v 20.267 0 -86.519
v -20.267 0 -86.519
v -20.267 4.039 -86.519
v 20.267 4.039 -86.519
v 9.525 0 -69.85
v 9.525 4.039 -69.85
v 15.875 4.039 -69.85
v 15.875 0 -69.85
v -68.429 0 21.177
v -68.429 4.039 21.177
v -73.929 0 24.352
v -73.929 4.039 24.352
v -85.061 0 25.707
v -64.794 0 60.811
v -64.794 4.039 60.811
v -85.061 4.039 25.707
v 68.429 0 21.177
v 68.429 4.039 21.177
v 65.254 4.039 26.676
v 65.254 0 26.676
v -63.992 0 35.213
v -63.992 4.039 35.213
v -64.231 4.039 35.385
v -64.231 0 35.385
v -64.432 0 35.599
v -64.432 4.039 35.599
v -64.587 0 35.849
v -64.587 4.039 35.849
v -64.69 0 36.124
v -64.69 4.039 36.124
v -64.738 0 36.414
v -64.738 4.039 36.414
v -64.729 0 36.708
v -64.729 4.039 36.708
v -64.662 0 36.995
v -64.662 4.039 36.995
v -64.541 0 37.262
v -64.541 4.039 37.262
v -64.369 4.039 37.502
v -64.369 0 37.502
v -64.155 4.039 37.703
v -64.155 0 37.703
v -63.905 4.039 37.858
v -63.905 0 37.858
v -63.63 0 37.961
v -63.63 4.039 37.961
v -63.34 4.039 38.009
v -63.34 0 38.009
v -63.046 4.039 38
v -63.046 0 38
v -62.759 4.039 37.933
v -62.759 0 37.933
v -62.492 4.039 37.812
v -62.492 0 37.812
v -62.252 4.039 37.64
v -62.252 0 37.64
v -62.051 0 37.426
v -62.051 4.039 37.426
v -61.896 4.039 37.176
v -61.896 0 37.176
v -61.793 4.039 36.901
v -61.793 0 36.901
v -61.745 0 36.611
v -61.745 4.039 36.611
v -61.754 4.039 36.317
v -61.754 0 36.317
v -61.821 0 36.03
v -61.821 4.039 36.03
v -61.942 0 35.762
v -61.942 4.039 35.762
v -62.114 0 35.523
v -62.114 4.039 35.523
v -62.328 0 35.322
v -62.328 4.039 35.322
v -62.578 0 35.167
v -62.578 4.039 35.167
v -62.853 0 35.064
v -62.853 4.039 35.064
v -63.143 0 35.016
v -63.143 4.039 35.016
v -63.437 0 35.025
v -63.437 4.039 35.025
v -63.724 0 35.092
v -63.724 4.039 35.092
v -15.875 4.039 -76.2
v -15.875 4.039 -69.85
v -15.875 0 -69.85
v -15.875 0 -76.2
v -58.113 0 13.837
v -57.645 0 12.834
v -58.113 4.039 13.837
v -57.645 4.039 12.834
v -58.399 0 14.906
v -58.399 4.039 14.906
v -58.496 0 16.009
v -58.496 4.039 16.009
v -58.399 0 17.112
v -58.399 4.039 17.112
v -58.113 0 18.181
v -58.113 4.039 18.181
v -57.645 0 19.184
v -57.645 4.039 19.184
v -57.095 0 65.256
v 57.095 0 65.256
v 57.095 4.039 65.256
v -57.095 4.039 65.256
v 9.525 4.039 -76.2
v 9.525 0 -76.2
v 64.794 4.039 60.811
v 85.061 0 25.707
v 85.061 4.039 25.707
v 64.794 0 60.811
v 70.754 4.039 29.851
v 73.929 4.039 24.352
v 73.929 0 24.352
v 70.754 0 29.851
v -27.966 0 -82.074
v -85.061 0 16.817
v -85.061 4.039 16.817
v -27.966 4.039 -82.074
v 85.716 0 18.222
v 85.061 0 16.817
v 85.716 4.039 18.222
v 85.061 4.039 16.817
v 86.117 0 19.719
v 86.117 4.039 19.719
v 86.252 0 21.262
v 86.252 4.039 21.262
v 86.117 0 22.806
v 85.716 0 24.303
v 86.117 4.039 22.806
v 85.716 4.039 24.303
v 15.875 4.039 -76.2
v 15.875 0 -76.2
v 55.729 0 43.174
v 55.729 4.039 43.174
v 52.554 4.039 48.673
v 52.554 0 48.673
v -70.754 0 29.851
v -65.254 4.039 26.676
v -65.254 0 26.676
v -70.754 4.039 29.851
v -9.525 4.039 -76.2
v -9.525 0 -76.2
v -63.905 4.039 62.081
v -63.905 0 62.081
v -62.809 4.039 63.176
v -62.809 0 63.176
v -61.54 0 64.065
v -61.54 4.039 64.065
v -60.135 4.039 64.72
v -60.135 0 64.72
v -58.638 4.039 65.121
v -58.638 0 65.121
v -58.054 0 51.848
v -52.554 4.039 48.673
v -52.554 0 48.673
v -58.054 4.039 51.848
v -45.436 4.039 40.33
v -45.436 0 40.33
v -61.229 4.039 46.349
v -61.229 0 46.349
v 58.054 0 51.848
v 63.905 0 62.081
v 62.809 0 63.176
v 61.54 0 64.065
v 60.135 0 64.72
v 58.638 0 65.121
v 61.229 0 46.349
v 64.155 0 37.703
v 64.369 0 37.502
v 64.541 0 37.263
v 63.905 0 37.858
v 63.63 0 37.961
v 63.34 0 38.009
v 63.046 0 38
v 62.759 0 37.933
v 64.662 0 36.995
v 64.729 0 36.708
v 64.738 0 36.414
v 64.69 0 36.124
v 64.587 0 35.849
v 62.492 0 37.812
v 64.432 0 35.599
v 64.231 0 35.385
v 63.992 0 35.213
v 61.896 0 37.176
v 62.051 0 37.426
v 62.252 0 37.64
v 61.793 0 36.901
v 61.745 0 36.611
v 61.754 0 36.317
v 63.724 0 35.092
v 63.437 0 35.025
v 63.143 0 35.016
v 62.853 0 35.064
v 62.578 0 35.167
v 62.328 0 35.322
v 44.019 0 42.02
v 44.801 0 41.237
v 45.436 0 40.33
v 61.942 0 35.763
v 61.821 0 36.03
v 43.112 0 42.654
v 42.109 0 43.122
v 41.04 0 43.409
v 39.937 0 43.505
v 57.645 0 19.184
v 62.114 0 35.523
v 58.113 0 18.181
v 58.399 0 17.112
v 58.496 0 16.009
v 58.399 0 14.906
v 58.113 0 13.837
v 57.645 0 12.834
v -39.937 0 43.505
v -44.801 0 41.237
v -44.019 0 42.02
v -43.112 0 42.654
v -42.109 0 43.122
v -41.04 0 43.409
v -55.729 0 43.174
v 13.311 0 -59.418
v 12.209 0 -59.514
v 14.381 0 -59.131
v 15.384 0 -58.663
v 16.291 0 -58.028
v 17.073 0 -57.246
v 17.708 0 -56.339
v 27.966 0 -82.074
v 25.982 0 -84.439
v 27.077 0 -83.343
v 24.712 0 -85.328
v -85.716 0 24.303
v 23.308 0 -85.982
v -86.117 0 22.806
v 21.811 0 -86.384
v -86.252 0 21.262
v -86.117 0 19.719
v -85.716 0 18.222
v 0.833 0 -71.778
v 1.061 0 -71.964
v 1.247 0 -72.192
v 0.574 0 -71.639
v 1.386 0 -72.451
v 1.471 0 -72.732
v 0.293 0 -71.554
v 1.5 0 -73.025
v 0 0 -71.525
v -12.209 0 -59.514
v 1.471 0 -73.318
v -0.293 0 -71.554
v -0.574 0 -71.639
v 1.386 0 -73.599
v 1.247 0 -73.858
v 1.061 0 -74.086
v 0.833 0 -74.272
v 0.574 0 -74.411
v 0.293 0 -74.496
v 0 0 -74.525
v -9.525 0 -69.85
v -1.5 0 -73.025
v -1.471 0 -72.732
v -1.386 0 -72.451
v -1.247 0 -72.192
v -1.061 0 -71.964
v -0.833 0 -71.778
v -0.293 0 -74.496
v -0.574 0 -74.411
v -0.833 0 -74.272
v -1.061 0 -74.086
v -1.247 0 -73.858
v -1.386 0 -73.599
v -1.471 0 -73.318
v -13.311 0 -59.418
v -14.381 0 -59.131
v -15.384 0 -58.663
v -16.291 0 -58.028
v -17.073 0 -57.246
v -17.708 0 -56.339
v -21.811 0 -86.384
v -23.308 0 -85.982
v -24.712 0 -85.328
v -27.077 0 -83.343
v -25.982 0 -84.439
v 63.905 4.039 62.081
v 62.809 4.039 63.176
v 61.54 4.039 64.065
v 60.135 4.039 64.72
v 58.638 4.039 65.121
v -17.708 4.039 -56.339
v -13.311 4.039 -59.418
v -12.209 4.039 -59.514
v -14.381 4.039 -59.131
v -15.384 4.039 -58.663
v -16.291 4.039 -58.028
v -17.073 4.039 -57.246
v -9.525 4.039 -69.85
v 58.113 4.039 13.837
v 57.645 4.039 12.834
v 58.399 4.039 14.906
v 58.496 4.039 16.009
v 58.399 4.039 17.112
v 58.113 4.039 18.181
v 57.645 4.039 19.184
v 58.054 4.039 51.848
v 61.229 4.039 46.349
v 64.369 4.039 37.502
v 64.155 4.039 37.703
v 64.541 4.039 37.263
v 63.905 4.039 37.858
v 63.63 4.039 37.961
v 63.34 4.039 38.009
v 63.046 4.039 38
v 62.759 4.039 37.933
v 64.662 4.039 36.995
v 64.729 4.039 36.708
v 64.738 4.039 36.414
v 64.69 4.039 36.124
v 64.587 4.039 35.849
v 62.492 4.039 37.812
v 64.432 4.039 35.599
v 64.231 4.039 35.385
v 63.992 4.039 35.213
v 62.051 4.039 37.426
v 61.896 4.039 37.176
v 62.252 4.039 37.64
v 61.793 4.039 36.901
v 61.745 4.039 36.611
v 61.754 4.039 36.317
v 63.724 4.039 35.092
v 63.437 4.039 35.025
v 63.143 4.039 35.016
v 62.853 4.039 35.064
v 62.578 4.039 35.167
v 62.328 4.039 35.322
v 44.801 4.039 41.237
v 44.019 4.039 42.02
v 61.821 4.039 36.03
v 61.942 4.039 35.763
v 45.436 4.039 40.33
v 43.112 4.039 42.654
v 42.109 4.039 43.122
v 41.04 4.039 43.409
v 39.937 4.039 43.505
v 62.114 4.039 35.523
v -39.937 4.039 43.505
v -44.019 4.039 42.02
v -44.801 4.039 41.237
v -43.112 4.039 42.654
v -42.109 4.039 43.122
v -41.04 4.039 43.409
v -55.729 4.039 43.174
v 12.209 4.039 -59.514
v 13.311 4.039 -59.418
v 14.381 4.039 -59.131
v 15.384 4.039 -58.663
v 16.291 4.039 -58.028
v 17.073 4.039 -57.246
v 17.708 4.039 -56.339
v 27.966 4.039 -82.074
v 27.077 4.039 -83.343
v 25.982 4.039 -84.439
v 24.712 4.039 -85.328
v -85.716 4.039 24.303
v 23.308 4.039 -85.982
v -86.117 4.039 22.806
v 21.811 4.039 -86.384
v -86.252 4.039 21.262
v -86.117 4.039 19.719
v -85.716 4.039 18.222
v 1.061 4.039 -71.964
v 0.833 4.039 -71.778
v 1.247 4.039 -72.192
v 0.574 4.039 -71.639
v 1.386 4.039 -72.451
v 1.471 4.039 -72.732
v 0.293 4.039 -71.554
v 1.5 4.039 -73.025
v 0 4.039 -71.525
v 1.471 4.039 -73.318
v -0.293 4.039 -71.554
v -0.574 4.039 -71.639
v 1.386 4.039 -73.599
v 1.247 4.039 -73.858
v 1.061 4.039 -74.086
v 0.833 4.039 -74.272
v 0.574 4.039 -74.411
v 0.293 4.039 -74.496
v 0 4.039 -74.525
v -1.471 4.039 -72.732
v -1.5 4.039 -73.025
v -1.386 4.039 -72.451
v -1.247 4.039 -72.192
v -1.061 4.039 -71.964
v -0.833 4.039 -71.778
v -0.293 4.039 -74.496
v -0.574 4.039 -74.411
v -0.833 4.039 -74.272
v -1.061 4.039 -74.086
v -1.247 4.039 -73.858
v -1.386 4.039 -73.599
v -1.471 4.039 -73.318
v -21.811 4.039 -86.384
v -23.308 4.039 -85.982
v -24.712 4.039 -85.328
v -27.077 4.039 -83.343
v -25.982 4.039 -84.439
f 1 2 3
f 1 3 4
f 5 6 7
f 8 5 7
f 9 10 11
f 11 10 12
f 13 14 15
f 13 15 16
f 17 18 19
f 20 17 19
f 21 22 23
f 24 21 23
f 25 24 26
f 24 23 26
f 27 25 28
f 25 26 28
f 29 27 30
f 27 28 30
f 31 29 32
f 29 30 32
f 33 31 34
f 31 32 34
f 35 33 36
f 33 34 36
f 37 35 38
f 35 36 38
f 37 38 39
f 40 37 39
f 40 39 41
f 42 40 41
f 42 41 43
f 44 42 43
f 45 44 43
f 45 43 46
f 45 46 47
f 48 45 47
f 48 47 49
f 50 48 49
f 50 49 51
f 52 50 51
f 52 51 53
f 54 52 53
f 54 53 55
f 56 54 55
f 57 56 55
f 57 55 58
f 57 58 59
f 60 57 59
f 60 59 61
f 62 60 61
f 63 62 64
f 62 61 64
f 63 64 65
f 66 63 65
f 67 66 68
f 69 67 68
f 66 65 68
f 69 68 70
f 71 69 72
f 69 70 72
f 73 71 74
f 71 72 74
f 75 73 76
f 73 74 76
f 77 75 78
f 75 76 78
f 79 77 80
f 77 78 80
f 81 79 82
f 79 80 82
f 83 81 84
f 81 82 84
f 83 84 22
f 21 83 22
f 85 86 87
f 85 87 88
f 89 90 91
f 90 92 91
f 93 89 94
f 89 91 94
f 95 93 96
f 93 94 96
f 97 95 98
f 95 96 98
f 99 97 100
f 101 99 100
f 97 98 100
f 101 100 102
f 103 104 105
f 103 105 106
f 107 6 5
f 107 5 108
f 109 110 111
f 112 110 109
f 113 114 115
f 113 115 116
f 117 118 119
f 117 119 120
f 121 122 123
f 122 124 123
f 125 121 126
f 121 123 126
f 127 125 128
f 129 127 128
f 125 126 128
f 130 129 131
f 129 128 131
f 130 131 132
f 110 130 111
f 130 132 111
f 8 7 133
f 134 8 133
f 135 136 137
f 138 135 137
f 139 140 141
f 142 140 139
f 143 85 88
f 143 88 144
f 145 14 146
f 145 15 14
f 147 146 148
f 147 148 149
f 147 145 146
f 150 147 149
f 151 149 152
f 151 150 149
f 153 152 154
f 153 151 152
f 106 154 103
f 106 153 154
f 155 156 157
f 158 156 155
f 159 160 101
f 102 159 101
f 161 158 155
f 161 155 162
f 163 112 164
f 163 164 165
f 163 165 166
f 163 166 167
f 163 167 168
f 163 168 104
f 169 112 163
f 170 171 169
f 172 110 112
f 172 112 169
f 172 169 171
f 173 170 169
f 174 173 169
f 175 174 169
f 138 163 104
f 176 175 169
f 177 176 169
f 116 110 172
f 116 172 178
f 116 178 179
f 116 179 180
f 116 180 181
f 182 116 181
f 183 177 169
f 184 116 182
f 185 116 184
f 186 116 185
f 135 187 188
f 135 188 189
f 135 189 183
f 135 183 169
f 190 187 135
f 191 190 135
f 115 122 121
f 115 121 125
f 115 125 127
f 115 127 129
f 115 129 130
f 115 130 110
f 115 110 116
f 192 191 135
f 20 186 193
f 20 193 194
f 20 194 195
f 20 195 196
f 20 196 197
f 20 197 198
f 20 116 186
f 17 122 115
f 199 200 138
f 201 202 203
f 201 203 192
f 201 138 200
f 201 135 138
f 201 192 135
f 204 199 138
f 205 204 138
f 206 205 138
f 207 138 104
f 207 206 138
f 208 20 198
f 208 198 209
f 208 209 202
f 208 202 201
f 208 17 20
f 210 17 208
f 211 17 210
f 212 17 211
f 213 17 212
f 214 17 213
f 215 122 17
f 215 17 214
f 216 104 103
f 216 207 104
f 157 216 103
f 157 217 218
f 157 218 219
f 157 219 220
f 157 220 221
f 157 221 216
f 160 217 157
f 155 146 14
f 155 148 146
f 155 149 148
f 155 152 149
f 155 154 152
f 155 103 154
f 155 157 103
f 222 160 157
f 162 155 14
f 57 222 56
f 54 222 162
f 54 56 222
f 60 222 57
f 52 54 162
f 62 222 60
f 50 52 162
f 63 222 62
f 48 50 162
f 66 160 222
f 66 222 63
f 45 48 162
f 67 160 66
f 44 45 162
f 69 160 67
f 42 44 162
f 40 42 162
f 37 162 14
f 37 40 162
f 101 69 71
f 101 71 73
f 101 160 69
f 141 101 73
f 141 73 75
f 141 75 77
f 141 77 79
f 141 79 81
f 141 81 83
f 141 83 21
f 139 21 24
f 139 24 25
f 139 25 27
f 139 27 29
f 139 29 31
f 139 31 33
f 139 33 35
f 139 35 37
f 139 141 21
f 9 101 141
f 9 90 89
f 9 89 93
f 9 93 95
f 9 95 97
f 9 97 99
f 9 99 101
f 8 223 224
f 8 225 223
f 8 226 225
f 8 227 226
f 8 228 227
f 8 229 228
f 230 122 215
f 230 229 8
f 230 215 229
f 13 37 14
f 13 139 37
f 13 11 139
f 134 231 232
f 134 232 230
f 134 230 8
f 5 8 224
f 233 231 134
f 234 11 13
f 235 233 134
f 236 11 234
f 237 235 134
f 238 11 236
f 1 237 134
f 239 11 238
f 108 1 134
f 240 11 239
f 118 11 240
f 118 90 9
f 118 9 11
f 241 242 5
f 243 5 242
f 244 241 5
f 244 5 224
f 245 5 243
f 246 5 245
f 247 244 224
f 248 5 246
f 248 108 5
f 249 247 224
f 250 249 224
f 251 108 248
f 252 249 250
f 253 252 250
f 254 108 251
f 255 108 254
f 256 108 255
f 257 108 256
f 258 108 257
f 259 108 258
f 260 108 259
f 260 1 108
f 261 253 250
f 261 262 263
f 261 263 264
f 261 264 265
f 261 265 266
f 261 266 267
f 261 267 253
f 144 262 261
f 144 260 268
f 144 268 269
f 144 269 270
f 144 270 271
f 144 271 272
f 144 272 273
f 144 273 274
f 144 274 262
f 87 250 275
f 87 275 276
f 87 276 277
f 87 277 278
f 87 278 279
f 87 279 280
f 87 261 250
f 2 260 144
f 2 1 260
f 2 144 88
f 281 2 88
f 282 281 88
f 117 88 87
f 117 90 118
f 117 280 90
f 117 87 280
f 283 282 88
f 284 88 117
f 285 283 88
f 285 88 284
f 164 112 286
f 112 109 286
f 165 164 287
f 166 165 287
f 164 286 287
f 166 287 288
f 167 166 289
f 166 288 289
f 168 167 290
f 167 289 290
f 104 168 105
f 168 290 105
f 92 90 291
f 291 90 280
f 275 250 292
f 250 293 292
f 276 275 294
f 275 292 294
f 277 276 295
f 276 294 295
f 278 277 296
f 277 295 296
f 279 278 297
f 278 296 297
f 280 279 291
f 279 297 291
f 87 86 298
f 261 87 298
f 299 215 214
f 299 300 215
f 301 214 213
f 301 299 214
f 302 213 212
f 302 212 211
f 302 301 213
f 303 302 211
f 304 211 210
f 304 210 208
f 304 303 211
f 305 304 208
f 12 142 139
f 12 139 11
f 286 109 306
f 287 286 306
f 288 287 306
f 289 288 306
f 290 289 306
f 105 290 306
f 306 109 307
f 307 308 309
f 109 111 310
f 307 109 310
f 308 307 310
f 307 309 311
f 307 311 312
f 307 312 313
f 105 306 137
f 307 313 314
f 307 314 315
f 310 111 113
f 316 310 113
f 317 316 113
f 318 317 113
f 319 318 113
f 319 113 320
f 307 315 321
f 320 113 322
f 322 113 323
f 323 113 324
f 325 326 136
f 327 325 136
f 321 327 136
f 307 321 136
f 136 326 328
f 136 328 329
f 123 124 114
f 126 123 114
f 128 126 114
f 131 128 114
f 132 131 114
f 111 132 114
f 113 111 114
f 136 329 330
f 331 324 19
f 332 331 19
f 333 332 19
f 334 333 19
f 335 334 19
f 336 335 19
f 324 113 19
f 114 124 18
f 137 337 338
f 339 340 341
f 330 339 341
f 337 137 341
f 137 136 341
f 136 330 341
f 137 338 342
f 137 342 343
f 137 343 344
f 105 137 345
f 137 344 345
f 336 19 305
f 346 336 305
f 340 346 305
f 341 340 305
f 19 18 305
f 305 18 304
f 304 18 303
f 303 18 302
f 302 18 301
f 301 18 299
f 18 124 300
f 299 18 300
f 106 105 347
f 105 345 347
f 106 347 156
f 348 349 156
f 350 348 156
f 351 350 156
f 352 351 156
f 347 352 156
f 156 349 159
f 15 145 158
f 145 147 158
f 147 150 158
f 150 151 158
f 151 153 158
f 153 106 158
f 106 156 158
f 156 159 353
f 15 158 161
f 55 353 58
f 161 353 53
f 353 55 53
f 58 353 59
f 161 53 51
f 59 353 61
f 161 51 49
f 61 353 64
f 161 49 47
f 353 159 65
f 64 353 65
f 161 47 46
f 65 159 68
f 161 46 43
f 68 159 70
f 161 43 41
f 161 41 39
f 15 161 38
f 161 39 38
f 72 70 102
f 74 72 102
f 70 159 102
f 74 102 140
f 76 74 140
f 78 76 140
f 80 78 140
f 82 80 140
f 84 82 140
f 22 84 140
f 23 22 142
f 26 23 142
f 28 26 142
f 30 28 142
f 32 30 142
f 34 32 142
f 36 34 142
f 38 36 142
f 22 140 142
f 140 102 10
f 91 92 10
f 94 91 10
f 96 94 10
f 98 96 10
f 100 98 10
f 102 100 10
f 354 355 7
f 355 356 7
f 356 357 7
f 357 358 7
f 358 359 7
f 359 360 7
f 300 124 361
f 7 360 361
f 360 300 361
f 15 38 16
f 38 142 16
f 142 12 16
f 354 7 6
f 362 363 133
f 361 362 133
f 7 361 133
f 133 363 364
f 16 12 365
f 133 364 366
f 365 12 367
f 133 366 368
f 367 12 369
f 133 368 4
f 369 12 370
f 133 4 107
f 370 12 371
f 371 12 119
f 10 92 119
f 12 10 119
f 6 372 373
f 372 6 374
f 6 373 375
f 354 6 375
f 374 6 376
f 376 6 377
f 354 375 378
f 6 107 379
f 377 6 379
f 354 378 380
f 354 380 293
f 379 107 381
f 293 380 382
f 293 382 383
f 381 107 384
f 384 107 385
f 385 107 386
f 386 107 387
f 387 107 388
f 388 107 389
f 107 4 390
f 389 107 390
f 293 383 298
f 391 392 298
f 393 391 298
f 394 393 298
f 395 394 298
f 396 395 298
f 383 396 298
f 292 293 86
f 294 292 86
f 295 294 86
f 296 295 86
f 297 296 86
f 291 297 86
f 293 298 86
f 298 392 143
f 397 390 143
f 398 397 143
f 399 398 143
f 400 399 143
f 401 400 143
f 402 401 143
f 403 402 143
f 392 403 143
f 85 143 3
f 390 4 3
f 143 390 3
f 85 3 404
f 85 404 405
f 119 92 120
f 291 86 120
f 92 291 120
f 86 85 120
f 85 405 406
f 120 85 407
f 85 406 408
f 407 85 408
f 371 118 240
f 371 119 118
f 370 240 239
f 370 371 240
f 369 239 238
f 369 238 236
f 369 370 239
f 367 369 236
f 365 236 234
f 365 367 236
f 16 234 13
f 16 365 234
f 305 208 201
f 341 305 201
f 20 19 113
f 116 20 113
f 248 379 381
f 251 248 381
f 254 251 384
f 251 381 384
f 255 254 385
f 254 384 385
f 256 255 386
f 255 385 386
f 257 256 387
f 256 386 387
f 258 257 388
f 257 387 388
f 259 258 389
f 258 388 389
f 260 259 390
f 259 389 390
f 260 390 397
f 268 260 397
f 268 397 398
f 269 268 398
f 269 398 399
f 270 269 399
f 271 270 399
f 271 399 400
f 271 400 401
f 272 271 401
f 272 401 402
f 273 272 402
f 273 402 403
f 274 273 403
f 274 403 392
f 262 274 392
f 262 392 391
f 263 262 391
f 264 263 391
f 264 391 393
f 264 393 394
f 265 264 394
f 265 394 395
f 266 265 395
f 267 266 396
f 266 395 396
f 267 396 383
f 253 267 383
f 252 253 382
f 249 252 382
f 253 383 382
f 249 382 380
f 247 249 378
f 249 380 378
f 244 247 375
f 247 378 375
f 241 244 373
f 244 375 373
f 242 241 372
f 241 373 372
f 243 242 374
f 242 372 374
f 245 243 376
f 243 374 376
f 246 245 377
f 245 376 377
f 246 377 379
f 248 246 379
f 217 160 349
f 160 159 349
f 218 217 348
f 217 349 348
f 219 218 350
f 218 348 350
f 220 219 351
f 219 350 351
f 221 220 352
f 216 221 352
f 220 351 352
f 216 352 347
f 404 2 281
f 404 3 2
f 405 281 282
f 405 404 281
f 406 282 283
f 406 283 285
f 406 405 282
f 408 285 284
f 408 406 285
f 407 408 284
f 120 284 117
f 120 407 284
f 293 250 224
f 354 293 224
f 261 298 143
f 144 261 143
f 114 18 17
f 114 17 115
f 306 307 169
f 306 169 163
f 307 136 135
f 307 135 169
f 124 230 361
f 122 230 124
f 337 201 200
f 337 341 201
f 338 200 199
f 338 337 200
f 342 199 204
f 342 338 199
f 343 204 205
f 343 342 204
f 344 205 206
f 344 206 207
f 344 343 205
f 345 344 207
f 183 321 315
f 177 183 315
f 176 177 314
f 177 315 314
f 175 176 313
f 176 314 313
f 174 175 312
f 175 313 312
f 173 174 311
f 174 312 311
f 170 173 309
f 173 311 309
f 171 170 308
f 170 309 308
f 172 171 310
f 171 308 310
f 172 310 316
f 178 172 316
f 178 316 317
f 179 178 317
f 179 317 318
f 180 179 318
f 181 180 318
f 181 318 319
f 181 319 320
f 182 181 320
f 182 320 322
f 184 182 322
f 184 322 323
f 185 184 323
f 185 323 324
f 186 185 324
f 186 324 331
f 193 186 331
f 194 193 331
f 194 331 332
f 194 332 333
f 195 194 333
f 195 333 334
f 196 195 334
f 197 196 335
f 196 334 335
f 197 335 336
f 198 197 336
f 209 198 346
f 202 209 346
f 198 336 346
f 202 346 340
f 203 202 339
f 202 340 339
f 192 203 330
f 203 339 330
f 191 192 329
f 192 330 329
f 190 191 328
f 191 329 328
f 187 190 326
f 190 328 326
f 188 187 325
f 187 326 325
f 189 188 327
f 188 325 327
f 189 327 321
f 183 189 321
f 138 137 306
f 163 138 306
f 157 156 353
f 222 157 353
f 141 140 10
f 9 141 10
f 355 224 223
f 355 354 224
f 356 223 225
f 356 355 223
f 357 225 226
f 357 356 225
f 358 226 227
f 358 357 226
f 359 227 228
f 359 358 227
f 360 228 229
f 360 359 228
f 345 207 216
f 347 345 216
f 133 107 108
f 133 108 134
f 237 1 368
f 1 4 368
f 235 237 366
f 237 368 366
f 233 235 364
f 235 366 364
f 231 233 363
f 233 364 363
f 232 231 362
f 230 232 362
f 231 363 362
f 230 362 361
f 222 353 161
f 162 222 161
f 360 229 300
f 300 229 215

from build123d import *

# Parameters (mm, degrees)
BOSS_EXTRUDE1_DEPTH = 4.0386
SKETCH2_R           = 1.5
SKETCH2_W           = 6.35
SKETCH2_H           = 6.35
CUT_EXTRUDE1_DEPTH  = 124.208459614
CIRPATTERN1_COUNT   = 3
FILLET1_R           = 8.89
FILLET2_R           = 6.35


with BuildPart() as part:
    # Sketch1 → Boss-Extrude1 (new body)
    with BuildSketch(Plane(origin=(0, 0, 0), x_dir=(1, 0, 0), z_dir=(0, 1, 0))):
        Polygon((-25.4, 86.518604358), (25.4, 86.518604358), (87.627309274, -21.262256923), (62.227309274, -65.256347435), (-62.227309274, -65.256347435), (-87.627309274, -21.262256923), align=None)
        Polygon((-15.875, 59.51410253), (15.875, 59.51410253), (59.478224675, -16.00889798), (43.603224675, -43.50520455), (-43.603224675, -43.50520455), (-59.478224675, -16.00889798), align=None, mode=Mode.SUBTRACT)
    extrude(amount=BOSS_EXTRUDE1_DEPTH)

    # Sketch2 → Cut-Extrude1 (cut, through all)
    with BuildSketch(Plane(origin=(0, 4.0386, 0), x_dir=(1, 0, 0), z_dir=(0, 1, 0))):
        with Locations((0, 73.025)):
            Circle(SKETCH2_R)
        with Locations((12.7, 73.025)):
            Rectangle(SKETCH2_W, SKETCH2_H)
        with Locations((-12.7, 73.025)):
            Rectangle(SKETCH2_W, SKETCH2_H)
    cut_extrude1 = extrude(amount=-CUT_EXTRUDE1_DEPTH, mode=Mode.SUBTRACT)

    # CirPattern1: Cut-Extrude1 ×3 about axis
    cirpattern1_axis = Axis((0, 2.328496272, 0), (0, 1, 0))
    for i in range(1, CIRPATTERN1_COUNT):
        add(cut_extrude1.rotate(cirpattern1_axis, i * 360 / CIRPATTERN1_COUNT), mode=Mode.SUBTRACT)

    # Fillet1
    fillet1_edges = [part.edges().sort_by_distance(p)[0] for p in [
        (-25.4, 2.0193, -86.518604358),
        (25.4, 2.0193, -86.518604358),
        (87.627309274, 2.0193, 21.262256923),
        (62.227309274, 2.0193, 65.256347435),
        (-87.627309274, 2.0193, 21.262256923),
        (-62.227309274, 2.0193, 65.256347435),
    ]]
    fillet(fillet1_edges, radius=FILLET1_R)

    # Fillet2
    fillet2_edges = [part.edges().sort_by_distance(p)[0] for p in [
        (15.875, 2.0193, -59.51410253),
        (-15.875, 2.0193, -59.51410253),
        (-59.478224675, 2.0193, 16.00889798),
        (-43.603224675, 2.0193, 43.50520455),
        (59.478224675, 2.0193, 16.00889798),
        (43.603224675, 2.0193, 43.50520455),
    ]]
    fillet(fillet2_edges, radius=FILLET2_R)


solid = part.part
